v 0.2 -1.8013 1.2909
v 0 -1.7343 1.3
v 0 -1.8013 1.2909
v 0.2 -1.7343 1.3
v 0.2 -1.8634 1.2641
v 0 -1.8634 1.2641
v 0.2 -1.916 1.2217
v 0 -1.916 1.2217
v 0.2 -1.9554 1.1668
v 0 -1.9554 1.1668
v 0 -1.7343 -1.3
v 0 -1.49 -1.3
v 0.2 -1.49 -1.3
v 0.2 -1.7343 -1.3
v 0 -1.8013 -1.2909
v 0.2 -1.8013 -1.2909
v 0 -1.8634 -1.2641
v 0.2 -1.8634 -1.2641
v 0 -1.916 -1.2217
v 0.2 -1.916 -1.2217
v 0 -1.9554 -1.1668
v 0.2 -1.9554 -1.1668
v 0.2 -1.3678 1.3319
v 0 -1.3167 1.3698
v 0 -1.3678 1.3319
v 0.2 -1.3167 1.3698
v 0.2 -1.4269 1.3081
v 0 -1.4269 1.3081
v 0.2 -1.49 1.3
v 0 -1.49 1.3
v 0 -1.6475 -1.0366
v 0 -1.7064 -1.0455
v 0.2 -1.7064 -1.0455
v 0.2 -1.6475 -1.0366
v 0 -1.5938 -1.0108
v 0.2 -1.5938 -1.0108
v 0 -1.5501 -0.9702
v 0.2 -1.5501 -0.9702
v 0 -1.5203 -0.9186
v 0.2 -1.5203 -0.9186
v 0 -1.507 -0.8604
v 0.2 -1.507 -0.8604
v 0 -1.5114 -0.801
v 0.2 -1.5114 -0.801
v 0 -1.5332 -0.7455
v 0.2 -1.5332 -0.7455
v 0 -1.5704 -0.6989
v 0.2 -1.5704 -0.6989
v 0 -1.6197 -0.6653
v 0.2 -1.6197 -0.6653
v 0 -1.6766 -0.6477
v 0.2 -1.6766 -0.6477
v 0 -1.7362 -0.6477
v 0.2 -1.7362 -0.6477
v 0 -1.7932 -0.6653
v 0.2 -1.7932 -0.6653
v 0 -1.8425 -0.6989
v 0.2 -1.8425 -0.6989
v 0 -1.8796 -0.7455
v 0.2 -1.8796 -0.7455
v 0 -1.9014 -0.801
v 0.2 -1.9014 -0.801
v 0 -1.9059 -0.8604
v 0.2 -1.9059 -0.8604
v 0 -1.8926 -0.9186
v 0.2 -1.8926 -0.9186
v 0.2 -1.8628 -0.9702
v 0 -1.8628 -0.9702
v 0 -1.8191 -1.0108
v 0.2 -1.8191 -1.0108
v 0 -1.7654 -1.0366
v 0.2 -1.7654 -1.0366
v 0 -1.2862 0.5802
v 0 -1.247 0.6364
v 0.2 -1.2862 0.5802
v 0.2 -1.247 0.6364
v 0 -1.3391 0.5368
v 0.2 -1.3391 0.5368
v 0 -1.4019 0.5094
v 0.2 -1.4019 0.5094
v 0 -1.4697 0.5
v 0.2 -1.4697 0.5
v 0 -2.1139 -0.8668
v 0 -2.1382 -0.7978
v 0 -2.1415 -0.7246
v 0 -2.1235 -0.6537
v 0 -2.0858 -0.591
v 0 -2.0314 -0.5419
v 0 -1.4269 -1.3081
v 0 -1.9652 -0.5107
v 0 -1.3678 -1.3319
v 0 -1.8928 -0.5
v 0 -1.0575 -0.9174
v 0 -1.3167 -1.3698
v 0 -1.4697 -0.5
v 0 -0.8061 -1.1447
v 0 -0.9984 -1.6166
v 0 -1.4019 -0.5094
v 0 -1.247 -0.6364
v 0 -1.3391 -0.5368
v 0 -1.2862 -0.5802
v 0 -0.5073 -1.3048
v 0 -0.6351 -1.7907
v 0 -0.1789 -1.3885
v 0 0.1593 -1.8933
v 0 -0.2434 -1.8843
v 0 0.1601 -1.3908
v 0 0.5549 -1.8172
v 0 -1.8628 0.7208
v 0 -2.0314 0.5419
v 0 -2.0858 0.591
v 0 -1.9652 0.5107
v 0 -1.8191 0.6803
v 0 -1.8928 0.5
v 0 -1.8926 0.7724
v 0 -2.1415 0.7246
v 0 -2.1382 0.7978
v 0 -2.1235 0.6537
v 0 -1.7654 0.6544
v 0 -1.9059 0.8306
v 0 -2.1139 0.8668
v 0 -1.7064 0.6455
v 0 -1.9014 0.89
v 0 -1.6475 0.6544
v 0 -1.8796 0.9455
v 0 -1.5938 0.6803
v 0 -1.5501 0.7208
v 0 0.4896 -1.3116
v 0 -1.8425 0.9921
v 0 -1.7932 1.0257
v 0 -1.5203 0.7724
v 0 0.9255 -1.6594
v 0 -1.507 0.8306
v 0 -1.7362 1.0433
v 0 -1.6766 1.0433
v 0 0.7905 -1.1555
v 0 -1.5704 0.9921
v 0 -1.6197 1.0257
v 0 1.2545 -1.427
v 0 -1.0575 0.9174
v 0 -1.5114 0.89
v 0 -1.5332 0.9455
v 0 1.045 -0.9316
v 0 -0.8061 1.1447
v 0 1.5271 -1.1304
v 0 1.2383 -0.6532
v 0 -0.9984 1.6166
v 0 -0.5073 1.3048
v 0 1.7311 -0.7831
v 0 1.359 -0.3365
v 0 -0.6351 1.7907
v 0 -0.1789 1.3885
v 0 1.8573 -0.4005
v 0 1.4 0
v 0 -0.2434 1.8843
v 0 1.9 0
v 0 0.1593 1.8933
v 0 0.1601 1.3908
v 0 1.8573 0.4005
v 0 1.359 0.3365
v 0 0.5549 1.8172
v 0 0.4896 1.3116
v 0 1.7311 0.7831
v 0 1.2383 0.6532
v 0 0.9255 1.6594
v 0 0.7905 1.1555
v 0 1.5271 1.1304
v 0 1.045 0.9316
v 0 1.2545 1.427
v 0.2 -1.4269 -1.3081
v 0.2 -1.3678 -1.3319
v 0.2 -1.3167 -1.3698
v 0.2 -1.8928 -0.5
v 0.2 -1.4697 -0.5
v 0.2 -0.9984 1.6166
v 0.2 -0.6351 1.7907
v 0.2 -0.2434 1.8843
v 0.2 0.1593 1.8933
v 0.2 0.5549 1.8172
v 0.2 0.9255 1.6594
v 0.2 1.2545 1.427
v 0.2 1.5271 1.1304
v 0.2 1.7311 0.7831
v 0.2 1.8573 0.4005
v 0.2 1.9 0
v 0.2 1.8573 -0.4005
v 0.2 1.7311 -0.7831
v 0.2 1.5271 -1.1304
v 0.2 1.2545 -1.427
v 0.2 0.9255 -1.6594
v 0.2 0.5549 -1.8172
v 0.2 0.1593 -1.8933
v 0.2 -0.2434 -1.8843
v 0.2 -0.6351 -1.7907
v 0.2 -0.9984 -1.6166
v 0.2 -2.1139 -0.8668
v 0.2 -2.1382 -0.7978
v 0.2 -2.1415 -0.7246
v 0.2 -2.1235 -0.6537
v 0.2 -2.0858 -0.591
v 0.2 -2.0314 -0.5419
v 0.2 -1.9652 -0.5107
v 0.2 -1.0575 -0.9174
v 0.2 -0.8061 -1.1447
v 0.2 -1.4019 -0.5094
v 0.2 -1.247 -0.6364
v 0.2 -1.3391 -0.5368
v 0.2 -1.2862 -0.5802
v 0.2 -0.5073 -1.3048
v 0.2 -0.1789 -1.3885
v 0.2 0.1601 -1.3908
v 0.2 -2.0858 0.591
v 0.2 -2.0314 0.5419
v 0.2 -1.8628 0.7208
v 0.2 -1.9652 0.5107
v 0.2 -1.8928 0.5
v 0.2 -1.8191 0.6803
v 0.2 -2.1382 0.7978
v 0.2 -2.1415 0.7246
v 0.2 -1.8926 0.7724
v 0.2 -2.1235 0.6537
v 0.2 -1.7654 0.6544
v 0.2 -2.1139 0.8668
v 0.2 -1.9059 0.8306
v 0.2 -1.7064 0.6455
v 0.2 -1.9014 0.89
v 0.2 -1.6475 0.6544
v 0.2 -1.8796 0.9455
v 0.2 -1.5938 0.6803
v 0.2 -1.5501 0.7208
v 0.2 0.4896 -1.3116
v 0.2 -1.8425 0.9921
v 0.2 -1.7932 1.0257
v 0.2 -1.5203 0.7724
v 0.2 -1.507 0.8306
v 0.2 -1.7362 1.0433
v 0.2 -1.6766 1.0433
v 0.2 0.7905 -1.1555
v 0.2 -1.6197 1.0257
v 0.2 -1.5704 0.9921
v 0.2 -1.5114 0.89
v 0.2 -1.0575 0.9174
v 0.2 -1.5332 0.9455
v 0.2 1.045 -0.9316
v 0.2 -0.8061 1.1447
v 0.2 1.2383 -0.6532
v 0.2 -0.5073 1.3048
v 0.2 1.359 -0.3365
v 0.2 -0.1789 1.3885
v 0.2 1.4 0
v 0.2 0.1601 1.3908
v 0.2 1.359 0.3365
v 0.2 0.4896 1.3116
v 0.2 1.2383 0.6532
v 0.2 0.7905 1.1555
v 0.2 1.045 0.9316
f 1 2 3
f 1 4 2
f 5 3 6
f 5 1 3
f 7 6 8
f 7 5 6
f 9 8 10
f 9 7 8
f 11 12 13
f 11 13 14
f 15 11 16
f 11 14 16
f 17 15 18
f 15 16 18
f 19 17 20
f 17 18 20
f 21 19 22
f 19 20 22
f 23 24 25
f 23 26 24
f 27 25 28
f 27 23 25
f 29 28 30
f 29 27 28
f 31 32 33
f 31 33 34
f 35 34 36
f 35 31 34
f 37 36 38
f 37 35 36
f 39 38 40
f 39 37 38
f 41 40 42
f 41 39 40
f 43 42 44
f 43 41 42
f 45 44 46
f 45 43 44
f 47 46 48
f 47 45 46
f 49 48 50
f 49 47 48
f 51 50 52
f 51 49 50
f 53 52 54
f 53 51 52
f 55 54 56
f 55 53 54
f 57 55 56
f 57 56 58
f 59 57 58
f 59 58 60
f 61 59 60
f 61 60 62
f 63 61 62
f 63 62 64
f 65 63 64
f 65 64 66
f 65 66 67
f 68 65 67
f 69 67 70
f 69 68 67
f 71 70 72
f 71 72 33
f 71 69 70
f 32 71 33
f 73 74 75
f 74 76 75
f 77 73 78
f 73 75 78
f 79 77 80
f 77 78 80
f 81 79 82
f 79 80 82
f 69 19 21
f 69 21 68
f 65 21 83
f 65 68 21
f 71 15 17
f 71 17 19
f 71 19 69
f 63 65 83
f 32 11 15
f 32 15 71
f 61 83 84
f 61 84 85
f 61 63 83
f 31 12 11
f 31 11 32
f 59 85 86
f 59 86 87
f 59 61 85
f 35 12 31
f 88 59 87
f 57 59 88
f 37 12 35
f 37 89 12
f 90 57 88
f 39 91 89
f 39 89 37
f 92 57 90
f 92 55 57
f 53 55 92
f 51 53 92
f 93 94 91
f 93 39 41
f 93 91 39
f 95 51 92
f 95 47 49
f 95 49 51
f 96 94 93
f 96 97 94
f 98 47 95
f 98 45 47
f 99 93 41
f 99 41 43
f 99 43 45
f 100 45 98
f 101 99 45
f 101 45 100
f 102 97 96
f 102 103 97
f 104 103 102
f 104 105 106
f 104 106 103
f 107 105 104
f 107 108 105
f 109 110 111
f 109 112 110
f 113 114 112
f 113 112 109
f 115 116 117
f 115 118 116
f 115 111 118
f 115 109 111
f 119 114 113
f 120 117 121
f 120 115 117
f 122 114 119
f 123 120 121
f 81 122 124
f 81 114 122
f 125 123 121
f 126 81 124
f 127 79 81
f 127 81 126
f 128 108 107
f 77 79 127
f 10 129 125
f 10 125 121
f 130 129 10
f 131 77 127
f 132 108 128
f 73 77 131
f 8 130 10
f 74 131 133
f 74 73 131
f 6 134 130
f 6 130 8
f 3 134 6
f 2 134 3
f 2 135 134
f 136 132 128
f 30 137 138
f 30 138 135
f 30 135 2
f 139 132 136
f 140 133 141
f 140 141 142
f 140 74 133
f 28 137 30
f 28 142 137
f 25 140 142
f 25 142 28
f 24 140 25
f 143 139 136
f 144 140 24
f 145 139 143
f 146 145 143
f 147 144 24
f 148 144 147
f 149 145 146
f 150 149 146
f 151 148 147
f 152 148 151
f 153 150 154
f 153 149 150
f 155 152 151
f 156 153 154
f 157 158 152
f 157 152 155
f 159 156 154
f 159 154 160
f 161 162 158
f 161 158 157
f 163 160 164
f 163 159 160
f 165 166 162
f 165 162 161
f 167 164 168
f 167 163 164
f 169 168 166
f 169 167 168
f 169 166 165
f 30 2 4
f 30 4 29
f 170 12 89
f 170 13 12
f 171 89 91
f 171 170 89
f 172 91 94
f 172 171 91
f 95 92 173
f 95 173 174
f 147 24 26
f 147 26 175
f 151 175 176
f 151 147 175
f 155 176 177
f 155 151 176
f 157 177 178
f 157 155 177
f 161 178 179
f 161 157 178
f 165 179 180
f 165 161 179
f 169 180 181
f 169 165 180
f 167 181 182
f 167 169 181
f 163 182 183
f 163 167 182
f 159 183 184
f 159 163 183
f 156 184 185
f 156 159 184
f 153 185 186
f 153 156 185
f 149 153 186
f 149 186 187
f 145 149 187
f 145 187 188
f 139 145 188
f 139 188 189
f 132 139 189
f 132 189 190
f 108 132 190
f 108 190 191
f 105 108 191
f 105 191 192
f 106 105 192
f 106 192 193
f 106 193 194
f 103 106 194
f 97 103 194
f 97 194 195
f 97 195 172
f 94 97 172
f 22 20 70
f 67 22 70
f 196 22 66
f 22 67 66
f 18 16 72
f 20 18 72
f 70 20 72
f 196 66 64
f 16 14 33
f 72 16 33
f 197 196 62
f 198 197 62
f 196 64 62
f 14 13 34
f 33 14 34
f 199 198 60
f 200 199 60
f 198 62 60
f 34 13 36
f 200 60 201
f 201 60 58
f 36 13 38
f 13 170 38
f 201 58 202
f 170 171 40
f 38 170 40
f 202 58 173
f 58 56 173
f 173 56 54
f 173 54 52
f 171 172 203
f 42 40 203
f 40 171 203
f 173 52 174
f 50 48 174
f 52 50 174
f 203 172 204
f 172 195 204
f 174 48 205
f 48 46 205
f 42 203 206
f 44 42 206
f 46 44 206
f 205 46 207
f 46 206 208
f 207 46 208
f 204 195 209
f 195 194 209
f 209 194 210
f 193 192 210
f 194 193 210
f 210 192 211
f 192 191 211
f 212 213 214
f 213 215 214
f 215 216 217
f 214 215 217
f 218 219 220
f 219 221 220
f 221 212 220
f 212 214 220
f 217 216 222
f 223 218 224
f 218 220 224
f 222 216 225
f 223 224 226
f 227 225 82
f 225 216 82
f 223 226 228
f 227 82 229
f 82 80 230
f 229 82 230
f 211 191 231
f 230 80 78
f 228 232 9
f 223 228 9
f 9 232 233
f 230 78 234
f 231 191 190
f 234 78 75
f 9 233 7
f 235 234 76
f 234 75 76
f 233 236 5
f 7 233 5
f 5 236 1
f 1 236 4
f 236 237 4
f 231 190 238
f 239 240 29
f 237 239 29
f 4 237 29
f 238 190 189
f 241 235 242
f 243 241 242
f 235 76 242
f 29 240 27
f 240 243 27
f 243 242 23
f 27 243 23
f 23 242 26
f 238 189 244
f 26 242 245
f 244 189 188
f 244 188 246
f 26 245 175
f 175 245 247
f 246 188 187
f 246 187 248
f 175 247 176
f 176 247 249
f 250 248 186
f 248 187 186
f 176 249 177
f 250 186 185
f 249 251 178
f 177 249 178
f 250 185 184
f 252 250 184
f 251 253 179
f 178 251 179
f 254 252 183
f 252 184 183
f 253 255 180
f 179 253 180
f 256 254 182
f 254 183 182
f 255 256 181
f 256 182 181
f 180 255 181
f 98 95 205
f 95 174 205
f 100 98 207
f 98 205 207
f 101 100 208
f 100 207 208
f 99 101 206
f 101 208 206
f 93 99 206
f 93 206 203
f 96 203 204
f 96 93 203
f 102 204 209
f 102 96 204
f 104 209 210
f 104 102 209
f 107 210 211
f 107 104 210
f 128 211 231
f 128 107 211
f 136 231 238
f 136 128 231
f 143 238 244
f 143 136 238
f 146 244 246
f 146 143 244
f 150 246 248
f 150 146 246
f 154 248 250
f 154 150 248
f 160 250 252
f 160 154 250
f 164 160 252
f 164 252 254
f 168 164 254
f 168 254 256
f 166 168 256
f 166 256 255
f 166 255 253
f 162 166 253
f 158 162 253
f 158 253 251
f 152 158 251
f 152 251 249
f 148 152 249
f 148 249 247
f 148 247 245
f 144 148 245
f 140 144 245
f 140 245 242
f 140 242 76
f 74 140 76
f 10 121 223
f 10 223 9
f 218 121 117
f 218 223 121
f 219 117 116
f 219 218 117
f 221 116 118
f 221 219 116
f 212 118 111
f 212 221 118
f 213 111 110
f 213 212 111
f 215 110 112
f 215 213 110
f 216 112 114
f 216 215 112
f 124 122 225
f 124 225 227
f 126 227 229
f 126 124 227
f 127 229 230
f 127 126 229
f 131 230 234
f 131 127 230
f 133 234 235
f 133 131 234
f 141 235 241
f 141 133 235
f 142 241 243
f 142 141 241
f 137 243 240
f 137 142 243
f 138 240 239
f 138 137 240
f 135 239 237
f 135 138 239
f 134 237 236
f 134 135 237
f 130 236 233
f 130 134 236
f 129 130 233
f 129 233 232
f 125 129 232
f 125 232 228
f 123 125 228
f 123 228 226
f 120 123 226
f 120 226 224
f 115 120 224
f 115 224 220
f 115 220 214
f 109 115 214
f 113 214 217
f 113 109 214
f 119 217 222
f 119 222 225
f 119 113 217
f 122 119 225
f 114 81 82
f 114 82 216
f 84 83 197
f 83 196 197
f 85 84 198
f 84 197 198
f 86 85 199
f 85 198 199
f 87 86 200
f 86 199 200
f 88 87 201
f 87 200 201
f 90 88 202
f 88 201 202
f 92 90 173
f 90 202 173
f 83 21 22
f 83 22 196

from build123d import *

# Parameters (mm, degrees)
SKETCH1_R           = 0.2
BOSS_EXTRUDE1_DEPTH = 0.2
FILLET1_R           = 0.25


with BuildPart() as part:
    # Sketch1 → Boss-Extrude1 (new body)
    with BuildSketch(Plane(origin=(0, 0, 0), x_dir=(0, 0, -1), z_dir=(1, 0, 0))):
        with BuildLine():
            Line((1.3, -1.385640646), (1.3, -1.884997731))
            Line((1.3, -1.884997731), (0.5, -2.307669683))
            Line((0.5, -2.307669683), (0.5, -1.307669683))
            ThreePointArc((0.5, -1.307669683), (0, 1.4), (-0.5, -1.307669683))
            Line((-0.5, -1.307669683), (-0.5, -2.307669683))
            Line((-0.5, -2.307669683), (-1.3, -1.884997731))
            Line((-1.3, -1.884997731), (-1.3, -1.385640646))
            ThreePointArc((-1.3, -1.385640646), (0, 1.9), (1.3, -1.385640646))
        make_face()
        with Locations((0.84550336, -1.706434434)):
            Circle(SKETCH1_R, mode=Mode.SUBTRACT)
        with Locations((-0.84550336, -1.706434434)):
            Circle(SKETCH1_R, mode=Mode.SUBTRACT)
    extrude(amount=BOSS_EXTRUDE1_DEPTH)

    # Fillet1
    fillet1_edges = [part.edges().sort_by_distance(p)[0] for p in [
        (0.1, -1.307669683, 0.5),
        (0.1, -2.307669683, 0.5),
        (0.1, -1.884997731, 1.3),
        (0.1, -1.385640646, 1.3),
        (0.1, -1.385640646, -1.3),
        (0.1, -1.884997731, -1.3),
        (0.1, -2.307669683, -0.5),
        (0.1, -1.307669683, -0.5),
    ]]
    fillet(fillet1_edges, radius=FILLET1_R)


solid = part.part
